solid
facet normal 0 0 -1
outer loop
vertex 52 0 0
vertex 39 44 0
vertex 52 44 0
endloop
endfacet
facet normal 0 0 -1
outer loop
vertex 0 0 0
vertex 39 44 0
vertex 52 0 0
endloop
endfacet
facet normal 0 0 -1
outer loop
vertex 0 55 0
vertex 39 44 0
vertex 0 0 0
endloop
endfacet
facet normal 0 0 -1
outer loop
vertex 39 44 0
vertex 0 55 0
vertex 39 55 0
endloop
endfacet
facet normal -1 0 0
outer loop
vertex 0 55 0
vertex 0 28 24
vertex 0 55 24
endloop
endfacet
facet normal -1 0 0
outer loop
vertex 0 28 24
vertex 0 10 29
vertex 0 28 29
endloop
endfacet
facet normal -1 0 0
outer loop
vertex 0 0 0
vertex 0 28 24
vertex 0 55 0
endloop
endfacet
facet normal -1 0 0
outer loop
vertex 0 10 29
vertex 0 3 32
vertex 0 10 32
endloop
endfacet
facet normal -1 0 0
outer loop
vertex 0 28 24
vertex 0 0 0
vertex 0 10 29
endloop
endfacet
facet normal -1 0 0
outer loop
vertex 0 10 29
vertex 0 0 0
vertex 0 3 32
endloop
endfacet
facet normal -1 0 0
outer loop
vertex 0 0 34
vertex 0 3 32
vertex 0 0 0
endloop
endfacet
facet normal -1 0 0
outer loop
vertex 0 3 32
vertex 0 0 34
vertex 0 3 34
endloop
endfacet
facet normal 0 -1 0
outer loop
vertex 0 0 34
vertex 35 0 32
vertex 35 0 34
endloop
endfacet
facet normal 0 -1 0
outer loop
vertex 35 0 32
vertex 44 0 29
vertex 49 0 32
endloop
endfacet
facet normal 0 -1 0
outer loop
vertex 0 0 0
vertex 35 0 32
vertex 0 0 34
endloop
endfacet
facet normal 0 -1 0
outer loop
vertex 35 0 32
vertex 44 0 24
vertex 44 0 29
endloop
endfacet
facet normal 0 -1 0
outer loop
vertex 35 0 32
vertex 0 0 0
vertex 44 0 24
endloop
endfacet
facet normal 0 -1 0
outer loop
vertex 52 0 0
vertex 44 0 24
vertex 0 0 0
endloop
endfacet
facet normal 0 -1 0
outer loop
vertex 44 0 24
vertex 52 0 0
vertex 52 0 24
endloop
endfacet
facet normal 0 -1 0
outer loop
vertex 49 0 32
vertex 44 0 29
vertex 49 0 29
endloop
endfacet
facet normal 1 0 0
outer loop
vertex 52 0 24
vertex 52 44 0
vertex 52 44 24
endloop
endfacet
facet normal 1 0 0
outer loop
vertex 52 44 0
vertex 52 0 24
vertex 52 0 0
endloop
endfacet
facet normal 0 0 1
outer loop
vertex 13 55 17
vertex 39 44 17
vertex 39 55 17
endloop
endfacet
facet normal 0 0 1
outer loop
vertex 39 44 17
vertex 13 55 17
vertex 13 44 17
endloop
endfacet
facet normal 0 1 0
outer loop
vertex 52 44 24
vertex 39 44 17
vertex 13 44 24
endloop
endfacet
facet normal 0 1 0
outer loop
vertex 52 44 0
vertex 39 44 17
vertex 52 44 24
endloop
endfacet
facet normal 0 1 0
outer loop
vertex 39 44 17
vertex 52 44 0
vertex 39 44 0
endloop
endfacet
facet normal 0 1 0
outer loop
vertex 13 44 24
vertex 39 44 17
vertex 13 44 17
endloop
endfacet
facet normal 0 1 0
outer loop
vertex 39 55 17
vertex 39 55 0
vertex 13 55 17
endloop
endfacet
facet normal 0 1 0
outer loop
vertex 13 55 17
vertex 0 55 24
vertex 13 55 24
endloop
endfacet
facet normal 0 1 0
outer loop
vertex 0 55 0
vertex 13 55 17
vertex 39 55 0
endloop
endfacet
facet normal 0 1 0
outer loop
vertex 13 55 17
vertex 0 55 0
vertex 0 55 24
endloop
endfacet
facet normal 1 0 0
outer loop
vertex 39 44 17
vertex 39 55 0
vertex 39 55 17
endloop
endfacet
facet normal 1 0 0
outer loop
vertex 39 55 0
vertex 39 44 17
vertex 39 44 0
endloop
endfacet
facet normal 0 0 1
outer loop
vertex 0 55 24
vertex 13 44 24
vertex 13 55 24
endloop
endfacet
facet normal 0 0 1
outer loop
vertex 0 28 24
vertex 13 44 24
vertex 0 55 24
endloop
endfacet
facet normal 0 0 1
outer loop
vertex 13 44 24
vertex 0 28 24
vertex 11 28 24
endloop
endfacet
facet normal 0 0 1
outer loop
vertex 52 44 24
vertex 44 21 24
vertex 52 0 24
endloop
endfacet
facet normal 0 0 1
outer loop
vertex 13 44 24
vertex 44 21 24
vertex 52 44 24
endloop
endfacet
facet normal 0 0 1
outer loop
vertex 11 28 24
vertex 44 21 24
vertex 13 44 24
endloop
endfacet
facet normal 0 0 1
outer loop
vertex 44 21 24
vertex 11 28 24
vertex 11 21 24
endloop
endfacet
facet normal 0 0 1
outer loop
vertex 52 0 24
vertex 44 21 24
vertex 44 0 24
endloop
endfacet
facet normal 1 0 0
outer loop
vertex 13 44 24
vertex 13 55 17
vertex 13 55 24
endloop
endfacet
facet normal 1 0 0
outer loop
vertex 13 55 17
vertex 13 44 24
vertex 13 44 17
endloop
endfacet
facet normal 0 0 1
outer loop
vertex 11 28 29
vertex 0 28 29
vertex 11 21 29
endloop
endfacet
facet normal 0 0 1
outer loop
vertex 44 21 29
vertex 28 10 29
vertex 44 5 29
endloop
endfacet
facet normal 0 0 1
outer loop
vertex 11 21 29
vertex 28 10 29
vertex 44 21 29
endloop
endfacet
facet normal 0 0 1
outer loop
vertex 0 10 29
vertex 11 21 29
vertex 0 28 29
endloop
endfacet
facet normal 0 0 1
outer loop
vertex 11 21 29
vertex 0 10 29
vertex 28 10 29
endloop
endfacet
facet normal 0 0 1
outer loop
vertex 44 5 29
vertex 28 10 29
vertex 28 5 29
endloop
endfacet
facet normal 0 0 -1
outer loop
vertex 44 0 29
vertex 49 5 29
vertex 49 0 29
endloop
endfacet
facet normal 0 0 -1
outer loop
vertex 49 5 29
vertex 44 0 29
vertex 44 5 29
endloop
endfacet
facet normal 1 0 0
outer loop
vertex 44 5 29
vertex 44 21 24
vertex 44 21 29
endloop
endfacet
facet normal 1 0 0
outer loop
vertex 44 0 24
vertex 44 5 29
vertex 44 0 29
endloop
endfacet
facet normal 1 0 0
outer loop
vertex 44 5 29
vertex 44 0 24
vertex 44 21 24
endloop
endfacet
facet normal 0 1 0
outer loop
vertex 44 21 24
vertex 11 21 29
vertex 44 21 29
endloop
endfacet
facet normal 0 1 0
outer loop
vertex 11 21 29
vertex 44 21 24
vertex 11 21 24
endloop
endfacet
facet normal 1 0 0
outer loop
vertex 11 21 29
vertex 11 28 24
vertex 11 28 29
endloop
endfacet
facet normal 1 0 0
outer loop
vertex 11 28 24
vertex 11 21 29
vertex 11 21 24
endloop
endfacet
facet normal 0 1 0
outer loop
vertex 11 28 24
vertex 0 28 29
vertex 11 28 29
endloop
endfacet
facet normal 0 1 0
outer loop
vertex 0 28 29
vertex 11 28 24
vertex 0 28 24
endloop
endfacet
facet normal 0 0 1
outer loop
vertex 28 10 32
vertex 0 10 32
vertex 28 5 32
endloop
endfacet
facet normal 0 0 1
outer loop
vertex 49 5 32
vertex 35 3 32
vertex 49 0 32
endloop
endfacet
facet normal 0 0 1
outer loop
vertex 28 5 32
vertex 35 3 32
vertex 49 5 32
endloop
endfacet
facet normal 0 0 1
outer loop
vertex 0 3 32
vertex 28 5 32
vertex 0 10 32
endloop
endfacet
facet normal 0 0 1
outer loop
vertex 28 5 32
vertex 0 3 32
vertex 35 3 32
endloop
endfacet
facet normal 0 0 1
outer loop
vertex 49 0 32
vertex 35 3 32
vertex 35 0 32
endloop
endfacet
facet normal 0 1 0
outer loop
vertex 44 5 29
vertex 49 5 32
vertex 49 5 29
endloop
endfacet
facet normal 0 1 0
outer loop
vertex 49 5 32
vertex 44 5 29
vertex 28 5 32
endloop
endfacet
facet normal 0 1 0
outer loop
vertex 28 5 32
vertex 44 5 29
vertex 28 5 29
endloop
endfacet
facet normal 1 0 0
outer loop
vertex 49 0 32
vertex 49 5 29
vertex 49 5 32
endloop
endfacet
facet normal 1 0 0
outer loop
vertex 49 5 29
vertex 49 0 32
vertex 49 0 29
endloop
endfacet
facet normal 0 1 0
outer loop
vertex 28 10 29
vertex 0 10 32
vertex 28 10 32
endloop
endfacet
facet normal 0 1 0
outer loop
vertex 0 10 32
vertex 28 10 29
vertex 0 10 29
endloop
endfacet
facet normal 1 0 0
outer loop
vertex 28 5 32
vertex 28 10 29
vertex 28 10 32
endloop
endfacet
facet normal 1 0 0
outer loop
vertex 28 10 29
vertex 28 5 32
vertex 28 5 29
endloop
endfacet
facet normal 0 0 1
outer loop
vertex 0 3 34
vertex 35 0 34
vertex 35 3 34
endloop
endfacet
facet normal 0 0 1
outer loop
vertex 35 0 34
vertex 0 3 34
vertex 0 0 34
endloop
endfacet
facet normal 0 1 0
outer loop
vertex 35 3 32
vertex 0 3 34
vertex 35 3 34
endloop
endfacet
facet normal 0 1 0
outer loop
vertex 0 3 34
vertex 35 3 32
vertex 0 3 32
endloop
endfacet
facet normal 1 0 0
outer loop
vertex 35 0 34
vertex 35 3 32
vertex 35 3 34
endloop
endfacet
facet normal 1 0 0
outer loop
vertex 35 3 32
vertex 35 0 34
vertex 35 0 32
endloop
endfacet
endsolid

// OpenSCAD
translate([6.5, 5.5, 8.5]) color([0.8047994372884794, 0.9431012043694105, 0.24264659424234813]) cube([13, 11, 17], center=true);
translate([19.5, 5.5, 8.5]) color([0.6738638931519124, 0.5327800265053269, 0.8756440829735669]) cube([13, 11, 17], center=true);
translate([32.5, 5.5, 8.5]) color([0.16255101499230828, 0.8680483691353614, 0.15305579700066485]) cube([13, 11, 17], center=true);
translate([45.5, 5.5, 8.5]) color([0.8462165202751376, 0.8200801239095041, 0.5849326984313064]) cube([13, 11, 17], center=true);
translate([6.5, 16.5, 8.5]) color([0.05125489506773162, 0.156166769208809, 0.34458118202681143]) cube([13, 11, 17], center=true);
translate([19.5, 16.5, 8.5]) color([0.291190613997825, 0.29342424365134856, 0.49485912757206985]) cube([13, 11, 17], center=true);
translate([32.5, 16.5, 8.5]) color([0.40365829021262367, 0.43100562682353716, 0.17003546655932655]) cube([13, 11, 17], center=true);
translate([45.5, 16.5, 8.5]) color([0.788340085303476, 0.5686027559906347, 0.44188886974638586]) cube([13, 11, 17], center=true);
translate([6.5, 27.5, 8.5]) color([0.3413461590512491, 0.009317740415098474, 0.72162474304745]) cube([13, 11, 17], center=true);
translate([19.5, 27.5, 8.5]) color([0.9099060293040379, 0.6642090292154819, 0.6628365798191557]) cube([13, 11, 17], center=true);
translate([32.5, 27.5, 8.5]) color([0.2575988974219705, 0.6122127561841502, 0.07024606726227145]) cube([13, 11, 17], center=true);
translate([45.5, 27.5, 8.5]) color([0.936077955543095, 0.27870721332570936, 0.8301443917589898]) cube([13, 11, 17], center=true);
translate([6.5, 38.5, 8.5]) color([0.5295296249528143, 0.06328696503387199, 0.639390097241117]) cube([13, 11, 17], center=true);
translate([19.5, 38.5, 8.5]) color([0.579686955437464, 0.9416538141960143, 0.6321291610349786]) cube([13, 11, 17], center=true);
translate([32.5, 38.5, 8.5]) color([0.5434228748459046, 0.38469874676133664, 0.434637548519362]) cube([13, 11, 17], center=true);
translate([45.5, 38.5, 8.5]) color([0.31139777068021024, 0.01363511702942577, 0.7785312160167684]) cube([13, 11, 17], center=true);
translate([6.5, 49.5, 8.5]) color([0.8197509625398982, 0.28044077713976767, 0.2581907625337724]) cube([13, 11, 17], center=true);
translate([19.5, 49.5, 8.5]) color([0.5272652548146236, 0.3179301097250754, 0.3422638341038545]) cube([13, 11, 17], center=true);
translate([32.5, 49.5, 8.5]) color([0.7055726929201963, 0.43169639849300545, 0.14170724037842175]) cube([13, 11, 17], center=true);
translate([6.5, 5.5, 20.5]) color([0.0059275683019511805, 0.5113413643489257, 0.7846494738841625]) cube([13, 11, 7], center=true);
translate([19.5, 5.5, 20.5]) color([0.7013909140505133, 0.7815279332048084, 0.38414456219182536]) cube([13, 11, 7], center=true);
translate([32.5, 5.5, 20.5]) color([0.4641305725985776, 0.036369164001931575, 0.9124290899309246]) cube([13, 11, 7], center=true);
translate([45.5, 5.5, 20.5]) color([0.6366653413633517, 0.798477007479407, 0.7602358551941967]) cube([13, 11, 7], center=true);
translate([6.5, 16.5, 20.5]) color([0.899814300356001, 0.3622224295816935, 0.9815510059994267]) cube([13, 11, 7], center=true);
translate([19.5, 16.5, 20.5]) color([0.15851660579635174, 0.19450942151924966, 0.35447317829590397]) cube([13, 11, 7], center=true);
translate([32.5, 16.5, 20.5]) color([0.700089123077614, 0.019141470871264166, 0.7352582011311831]) cube([13, 11, 7], center=true);
translate([45.5, 16.5, 20.5]) color([0.5715587801616956, 0.24207966979200135, 0.18514161515939986]) cube([13, 11, 7], center=true);
translate([6.5, 27.5, 20.5]) color([0.7580746928341441, 0.4199819570625165, 0.5731405723704375]) cube([13, 11, 7], center=true);
translate([19.5, 27.5, 20.5]) color([0.23673356878784502, 0.7138158488992904, 0.8637627475626694]) cube([13, 11, 7], center=true);
translate([32.5, 27.5, 20.5]) color([0.8949592620642776, 0.8103115760161889, 0.1004216369837837]) cube([13, 11, 7], center=true);
translate([45.5, 27.5, 20.5]) color([0.18827941391234093, 0.44049583318501173, 0.06522983258952386]) cube([13, 11, 7], center=true);
translate([6.5, 38.5, 20.5]) color([0.42674703623912436, 0.3947422574489625, 0.27185274848852736]) cube([13, 11, 7], center=true);
translate([19.5, 38.5, 20.5]) color([0.43721657158275895, 0.7577296702077931, 0.3561631337530091]) cube([13, 11, 7], center=true);
translate([32.5, 38.5, 20.5]) color([0.3277620307403001, 0.30701912216942273, 0.492518074892234]) cube([13, 11, 7], center=true);
translate([45.5, 38.5, 20.5]) color([0.7625268269371841, 0.2027877178963453, 0.39789846082497404]) cube([13, 11, 7], center=true);
translate([6.5, 49.5, 20.5]) color([0.4356119392473006, 0.6353731723550147, 0.673076446274384]) cube([13, 11, 7], center=true);
translate([5.5, 3.5, 26.5]) color([0.6970991483341651, 0.8225488218547198, 0.5826892216899469]) cube([11, 7, 5], center=true);
translate([16.5, 3.5, 26.5]) color([0.3545830833155835, 0.5687886411459258, 0.564415288794693]) cube([11, 7, 5], center=true);
translate([27.5, 3.5, 26.5]) color([0.2783497745403337, 0.8220051901362931, 0.39809270556066123]) cube([11, 7, 5], center=true);
translate([38.5, 3.5, 26.5]) color([0.9209203386432881, 0.13533998311747797, 0.08148203466772541]) cube([11, 7, 5], center=true);
translate([5.5, 10.5, 26.5]) color([0.8649487446802395, 0.36102136972914045, 0.06937329613248533]) cube([11, 7, 5], center=true);
translate([16.5, 10.5, 26.5]) color([0.7172877126247486, 0.671396341477498, 0.47110224547326685]) cube([11, 7, 5], center=true);
translate([27.5, 10.5, 26.5]) color([0.3145322421799046, 0.8413649413366762, 0.9545082818366412]) cube([11, 7, 5], center=true);
translate([38.5, 10.5, 26.5]) color([0.02538948740661906, 0.39264862168779513, 0.12527064222330164]) cube([11, 7, 5], center=true);
translate([5.5, 17.5, 26.5]) color([0.9928151500577586, 0.6355716010561779, 0.40641678624517696]) cube([11, 7, 5], center=true);
translate([16.5, 17.5, 26.5]) color([0.1421319514189895, 0.14748951348813844, 0.8666090764559645]) cube([11, 7, 5], center=true);
translate([27.5, 17.5, 26.5]) color([0.5114920143771782, 0.16291179601388028, 0.8928293074217152]) cube([11, 7, 5], center=true);
translate([38.5, 17.5, 26.5]) color([0.9106207302279238, 0.7053130391381187, 0.7162737307255599]) cube([11, 7, 5], center=true);
translate([5.5, 24.5, 26.5]) color([0.7235742512845528, 0.7298089625221481, 0.5196081403156461]) cube([11, 7, 5], center=true);
translate([3.5, 2.5, 30.5]) color([0.823493134639761, 0.6911885197769689, 0.6973164426626367]) cube([7, 5, 3], center=true);
translate([10.5, 2.5, 30.5]) color([0.38726457915960755, 0.18022138882203653, 0.8001465394041192]) cube([7, 5, 3], center=true);
translate([17.5, 2.5, 30.5]) color([0.8129994204848935, 0.08072942167368968, 0.17442535469903642]) cube([7, 5, 3], center=true);
translate([24.5, 2.5, 30.5]) color([0.26558344961408153, 0.8002006207478382, 0.3279381595582189]) cube([7, 5, 3], center=true);
translate([31.5, 2.5, 30.5]) color([0.7086727191051987, 0.7823295314553788, 0.5174360046946651]) cube([7, 5, 3], center=true);
translate([38.5, 2.5, 30.5]) color([0.45647885649310815, 0.9099967640280606, 0.7566722996545016]) cube([7, 5, 3], center=true);
translate([45.5, 2.5, 30.5]) color([0.44882496858184395, 0.15281911968142636, 0.6325441046469116]) cube([7, 5, 3], center=true);
translate([3.5, 7.5, 30.5]) color([0.1769660088535372, 0.5122224095001495, 0.8959696721858674]) cube([7, 5, 3], center=true);
translate([10.5, 7.5, 30.5]) color([0.31608020378500323, 0.9467436825606468, 0.1928870204716916]) cube([7, 5, 3], center=true);
translate([17.5, 7.5, 30.5]) color([0.7910187054913302, 0.6108926701450443, 0.8122678209742187]) cube([7, 5, 3], center=true);
translate([24.5, 7.5, 30.5]) color([0.5222627979471512, 0.7095307583634994, 0.9126687247694082]) cube([7, 5, 3], center=true);
translate([2.5, 1.5, 33.0]) color([0.13487625477079712, 0.7715208720856912, 0.05716454642595936]) cube([5, 3, 2], center=true);
translate([7.5, 1.5, 33.0]) color([0.08241654053773162, 0.5176706786705761, 0.0024604932439482585]) cube([5, 3, 2], center=true);
translate([12.5, 1.5, 33.0]) color([0.774865046739482, 0.10398133417765076, 0.6075408633971222]) cube([5, 3, 2], center=true);
translate([17.5, 1.5, 33.0]) color([0.5702741924791085, 0.335807396721168, 0.3780654483467295]) cube([5, 3, 2], center=true);
translate([22.5, 1.5, 33.0]) color([0.36205489178930694, 0.8413126085807436, 0.6365683683667089]) cube([5, 3, 2], center=true);
translate([27.5, 1.5, 33.0]) color([0.13610848275491239, 0.9255182446742467, 0.18259927432055334]) cube([5, 3, 2], center=true);
translate([32.5, 1.5, 33.0]) color([0.12509989752770068, 0.33788945440902196, 0.607477949510089]) cube([5, 3, 2], center=true);
